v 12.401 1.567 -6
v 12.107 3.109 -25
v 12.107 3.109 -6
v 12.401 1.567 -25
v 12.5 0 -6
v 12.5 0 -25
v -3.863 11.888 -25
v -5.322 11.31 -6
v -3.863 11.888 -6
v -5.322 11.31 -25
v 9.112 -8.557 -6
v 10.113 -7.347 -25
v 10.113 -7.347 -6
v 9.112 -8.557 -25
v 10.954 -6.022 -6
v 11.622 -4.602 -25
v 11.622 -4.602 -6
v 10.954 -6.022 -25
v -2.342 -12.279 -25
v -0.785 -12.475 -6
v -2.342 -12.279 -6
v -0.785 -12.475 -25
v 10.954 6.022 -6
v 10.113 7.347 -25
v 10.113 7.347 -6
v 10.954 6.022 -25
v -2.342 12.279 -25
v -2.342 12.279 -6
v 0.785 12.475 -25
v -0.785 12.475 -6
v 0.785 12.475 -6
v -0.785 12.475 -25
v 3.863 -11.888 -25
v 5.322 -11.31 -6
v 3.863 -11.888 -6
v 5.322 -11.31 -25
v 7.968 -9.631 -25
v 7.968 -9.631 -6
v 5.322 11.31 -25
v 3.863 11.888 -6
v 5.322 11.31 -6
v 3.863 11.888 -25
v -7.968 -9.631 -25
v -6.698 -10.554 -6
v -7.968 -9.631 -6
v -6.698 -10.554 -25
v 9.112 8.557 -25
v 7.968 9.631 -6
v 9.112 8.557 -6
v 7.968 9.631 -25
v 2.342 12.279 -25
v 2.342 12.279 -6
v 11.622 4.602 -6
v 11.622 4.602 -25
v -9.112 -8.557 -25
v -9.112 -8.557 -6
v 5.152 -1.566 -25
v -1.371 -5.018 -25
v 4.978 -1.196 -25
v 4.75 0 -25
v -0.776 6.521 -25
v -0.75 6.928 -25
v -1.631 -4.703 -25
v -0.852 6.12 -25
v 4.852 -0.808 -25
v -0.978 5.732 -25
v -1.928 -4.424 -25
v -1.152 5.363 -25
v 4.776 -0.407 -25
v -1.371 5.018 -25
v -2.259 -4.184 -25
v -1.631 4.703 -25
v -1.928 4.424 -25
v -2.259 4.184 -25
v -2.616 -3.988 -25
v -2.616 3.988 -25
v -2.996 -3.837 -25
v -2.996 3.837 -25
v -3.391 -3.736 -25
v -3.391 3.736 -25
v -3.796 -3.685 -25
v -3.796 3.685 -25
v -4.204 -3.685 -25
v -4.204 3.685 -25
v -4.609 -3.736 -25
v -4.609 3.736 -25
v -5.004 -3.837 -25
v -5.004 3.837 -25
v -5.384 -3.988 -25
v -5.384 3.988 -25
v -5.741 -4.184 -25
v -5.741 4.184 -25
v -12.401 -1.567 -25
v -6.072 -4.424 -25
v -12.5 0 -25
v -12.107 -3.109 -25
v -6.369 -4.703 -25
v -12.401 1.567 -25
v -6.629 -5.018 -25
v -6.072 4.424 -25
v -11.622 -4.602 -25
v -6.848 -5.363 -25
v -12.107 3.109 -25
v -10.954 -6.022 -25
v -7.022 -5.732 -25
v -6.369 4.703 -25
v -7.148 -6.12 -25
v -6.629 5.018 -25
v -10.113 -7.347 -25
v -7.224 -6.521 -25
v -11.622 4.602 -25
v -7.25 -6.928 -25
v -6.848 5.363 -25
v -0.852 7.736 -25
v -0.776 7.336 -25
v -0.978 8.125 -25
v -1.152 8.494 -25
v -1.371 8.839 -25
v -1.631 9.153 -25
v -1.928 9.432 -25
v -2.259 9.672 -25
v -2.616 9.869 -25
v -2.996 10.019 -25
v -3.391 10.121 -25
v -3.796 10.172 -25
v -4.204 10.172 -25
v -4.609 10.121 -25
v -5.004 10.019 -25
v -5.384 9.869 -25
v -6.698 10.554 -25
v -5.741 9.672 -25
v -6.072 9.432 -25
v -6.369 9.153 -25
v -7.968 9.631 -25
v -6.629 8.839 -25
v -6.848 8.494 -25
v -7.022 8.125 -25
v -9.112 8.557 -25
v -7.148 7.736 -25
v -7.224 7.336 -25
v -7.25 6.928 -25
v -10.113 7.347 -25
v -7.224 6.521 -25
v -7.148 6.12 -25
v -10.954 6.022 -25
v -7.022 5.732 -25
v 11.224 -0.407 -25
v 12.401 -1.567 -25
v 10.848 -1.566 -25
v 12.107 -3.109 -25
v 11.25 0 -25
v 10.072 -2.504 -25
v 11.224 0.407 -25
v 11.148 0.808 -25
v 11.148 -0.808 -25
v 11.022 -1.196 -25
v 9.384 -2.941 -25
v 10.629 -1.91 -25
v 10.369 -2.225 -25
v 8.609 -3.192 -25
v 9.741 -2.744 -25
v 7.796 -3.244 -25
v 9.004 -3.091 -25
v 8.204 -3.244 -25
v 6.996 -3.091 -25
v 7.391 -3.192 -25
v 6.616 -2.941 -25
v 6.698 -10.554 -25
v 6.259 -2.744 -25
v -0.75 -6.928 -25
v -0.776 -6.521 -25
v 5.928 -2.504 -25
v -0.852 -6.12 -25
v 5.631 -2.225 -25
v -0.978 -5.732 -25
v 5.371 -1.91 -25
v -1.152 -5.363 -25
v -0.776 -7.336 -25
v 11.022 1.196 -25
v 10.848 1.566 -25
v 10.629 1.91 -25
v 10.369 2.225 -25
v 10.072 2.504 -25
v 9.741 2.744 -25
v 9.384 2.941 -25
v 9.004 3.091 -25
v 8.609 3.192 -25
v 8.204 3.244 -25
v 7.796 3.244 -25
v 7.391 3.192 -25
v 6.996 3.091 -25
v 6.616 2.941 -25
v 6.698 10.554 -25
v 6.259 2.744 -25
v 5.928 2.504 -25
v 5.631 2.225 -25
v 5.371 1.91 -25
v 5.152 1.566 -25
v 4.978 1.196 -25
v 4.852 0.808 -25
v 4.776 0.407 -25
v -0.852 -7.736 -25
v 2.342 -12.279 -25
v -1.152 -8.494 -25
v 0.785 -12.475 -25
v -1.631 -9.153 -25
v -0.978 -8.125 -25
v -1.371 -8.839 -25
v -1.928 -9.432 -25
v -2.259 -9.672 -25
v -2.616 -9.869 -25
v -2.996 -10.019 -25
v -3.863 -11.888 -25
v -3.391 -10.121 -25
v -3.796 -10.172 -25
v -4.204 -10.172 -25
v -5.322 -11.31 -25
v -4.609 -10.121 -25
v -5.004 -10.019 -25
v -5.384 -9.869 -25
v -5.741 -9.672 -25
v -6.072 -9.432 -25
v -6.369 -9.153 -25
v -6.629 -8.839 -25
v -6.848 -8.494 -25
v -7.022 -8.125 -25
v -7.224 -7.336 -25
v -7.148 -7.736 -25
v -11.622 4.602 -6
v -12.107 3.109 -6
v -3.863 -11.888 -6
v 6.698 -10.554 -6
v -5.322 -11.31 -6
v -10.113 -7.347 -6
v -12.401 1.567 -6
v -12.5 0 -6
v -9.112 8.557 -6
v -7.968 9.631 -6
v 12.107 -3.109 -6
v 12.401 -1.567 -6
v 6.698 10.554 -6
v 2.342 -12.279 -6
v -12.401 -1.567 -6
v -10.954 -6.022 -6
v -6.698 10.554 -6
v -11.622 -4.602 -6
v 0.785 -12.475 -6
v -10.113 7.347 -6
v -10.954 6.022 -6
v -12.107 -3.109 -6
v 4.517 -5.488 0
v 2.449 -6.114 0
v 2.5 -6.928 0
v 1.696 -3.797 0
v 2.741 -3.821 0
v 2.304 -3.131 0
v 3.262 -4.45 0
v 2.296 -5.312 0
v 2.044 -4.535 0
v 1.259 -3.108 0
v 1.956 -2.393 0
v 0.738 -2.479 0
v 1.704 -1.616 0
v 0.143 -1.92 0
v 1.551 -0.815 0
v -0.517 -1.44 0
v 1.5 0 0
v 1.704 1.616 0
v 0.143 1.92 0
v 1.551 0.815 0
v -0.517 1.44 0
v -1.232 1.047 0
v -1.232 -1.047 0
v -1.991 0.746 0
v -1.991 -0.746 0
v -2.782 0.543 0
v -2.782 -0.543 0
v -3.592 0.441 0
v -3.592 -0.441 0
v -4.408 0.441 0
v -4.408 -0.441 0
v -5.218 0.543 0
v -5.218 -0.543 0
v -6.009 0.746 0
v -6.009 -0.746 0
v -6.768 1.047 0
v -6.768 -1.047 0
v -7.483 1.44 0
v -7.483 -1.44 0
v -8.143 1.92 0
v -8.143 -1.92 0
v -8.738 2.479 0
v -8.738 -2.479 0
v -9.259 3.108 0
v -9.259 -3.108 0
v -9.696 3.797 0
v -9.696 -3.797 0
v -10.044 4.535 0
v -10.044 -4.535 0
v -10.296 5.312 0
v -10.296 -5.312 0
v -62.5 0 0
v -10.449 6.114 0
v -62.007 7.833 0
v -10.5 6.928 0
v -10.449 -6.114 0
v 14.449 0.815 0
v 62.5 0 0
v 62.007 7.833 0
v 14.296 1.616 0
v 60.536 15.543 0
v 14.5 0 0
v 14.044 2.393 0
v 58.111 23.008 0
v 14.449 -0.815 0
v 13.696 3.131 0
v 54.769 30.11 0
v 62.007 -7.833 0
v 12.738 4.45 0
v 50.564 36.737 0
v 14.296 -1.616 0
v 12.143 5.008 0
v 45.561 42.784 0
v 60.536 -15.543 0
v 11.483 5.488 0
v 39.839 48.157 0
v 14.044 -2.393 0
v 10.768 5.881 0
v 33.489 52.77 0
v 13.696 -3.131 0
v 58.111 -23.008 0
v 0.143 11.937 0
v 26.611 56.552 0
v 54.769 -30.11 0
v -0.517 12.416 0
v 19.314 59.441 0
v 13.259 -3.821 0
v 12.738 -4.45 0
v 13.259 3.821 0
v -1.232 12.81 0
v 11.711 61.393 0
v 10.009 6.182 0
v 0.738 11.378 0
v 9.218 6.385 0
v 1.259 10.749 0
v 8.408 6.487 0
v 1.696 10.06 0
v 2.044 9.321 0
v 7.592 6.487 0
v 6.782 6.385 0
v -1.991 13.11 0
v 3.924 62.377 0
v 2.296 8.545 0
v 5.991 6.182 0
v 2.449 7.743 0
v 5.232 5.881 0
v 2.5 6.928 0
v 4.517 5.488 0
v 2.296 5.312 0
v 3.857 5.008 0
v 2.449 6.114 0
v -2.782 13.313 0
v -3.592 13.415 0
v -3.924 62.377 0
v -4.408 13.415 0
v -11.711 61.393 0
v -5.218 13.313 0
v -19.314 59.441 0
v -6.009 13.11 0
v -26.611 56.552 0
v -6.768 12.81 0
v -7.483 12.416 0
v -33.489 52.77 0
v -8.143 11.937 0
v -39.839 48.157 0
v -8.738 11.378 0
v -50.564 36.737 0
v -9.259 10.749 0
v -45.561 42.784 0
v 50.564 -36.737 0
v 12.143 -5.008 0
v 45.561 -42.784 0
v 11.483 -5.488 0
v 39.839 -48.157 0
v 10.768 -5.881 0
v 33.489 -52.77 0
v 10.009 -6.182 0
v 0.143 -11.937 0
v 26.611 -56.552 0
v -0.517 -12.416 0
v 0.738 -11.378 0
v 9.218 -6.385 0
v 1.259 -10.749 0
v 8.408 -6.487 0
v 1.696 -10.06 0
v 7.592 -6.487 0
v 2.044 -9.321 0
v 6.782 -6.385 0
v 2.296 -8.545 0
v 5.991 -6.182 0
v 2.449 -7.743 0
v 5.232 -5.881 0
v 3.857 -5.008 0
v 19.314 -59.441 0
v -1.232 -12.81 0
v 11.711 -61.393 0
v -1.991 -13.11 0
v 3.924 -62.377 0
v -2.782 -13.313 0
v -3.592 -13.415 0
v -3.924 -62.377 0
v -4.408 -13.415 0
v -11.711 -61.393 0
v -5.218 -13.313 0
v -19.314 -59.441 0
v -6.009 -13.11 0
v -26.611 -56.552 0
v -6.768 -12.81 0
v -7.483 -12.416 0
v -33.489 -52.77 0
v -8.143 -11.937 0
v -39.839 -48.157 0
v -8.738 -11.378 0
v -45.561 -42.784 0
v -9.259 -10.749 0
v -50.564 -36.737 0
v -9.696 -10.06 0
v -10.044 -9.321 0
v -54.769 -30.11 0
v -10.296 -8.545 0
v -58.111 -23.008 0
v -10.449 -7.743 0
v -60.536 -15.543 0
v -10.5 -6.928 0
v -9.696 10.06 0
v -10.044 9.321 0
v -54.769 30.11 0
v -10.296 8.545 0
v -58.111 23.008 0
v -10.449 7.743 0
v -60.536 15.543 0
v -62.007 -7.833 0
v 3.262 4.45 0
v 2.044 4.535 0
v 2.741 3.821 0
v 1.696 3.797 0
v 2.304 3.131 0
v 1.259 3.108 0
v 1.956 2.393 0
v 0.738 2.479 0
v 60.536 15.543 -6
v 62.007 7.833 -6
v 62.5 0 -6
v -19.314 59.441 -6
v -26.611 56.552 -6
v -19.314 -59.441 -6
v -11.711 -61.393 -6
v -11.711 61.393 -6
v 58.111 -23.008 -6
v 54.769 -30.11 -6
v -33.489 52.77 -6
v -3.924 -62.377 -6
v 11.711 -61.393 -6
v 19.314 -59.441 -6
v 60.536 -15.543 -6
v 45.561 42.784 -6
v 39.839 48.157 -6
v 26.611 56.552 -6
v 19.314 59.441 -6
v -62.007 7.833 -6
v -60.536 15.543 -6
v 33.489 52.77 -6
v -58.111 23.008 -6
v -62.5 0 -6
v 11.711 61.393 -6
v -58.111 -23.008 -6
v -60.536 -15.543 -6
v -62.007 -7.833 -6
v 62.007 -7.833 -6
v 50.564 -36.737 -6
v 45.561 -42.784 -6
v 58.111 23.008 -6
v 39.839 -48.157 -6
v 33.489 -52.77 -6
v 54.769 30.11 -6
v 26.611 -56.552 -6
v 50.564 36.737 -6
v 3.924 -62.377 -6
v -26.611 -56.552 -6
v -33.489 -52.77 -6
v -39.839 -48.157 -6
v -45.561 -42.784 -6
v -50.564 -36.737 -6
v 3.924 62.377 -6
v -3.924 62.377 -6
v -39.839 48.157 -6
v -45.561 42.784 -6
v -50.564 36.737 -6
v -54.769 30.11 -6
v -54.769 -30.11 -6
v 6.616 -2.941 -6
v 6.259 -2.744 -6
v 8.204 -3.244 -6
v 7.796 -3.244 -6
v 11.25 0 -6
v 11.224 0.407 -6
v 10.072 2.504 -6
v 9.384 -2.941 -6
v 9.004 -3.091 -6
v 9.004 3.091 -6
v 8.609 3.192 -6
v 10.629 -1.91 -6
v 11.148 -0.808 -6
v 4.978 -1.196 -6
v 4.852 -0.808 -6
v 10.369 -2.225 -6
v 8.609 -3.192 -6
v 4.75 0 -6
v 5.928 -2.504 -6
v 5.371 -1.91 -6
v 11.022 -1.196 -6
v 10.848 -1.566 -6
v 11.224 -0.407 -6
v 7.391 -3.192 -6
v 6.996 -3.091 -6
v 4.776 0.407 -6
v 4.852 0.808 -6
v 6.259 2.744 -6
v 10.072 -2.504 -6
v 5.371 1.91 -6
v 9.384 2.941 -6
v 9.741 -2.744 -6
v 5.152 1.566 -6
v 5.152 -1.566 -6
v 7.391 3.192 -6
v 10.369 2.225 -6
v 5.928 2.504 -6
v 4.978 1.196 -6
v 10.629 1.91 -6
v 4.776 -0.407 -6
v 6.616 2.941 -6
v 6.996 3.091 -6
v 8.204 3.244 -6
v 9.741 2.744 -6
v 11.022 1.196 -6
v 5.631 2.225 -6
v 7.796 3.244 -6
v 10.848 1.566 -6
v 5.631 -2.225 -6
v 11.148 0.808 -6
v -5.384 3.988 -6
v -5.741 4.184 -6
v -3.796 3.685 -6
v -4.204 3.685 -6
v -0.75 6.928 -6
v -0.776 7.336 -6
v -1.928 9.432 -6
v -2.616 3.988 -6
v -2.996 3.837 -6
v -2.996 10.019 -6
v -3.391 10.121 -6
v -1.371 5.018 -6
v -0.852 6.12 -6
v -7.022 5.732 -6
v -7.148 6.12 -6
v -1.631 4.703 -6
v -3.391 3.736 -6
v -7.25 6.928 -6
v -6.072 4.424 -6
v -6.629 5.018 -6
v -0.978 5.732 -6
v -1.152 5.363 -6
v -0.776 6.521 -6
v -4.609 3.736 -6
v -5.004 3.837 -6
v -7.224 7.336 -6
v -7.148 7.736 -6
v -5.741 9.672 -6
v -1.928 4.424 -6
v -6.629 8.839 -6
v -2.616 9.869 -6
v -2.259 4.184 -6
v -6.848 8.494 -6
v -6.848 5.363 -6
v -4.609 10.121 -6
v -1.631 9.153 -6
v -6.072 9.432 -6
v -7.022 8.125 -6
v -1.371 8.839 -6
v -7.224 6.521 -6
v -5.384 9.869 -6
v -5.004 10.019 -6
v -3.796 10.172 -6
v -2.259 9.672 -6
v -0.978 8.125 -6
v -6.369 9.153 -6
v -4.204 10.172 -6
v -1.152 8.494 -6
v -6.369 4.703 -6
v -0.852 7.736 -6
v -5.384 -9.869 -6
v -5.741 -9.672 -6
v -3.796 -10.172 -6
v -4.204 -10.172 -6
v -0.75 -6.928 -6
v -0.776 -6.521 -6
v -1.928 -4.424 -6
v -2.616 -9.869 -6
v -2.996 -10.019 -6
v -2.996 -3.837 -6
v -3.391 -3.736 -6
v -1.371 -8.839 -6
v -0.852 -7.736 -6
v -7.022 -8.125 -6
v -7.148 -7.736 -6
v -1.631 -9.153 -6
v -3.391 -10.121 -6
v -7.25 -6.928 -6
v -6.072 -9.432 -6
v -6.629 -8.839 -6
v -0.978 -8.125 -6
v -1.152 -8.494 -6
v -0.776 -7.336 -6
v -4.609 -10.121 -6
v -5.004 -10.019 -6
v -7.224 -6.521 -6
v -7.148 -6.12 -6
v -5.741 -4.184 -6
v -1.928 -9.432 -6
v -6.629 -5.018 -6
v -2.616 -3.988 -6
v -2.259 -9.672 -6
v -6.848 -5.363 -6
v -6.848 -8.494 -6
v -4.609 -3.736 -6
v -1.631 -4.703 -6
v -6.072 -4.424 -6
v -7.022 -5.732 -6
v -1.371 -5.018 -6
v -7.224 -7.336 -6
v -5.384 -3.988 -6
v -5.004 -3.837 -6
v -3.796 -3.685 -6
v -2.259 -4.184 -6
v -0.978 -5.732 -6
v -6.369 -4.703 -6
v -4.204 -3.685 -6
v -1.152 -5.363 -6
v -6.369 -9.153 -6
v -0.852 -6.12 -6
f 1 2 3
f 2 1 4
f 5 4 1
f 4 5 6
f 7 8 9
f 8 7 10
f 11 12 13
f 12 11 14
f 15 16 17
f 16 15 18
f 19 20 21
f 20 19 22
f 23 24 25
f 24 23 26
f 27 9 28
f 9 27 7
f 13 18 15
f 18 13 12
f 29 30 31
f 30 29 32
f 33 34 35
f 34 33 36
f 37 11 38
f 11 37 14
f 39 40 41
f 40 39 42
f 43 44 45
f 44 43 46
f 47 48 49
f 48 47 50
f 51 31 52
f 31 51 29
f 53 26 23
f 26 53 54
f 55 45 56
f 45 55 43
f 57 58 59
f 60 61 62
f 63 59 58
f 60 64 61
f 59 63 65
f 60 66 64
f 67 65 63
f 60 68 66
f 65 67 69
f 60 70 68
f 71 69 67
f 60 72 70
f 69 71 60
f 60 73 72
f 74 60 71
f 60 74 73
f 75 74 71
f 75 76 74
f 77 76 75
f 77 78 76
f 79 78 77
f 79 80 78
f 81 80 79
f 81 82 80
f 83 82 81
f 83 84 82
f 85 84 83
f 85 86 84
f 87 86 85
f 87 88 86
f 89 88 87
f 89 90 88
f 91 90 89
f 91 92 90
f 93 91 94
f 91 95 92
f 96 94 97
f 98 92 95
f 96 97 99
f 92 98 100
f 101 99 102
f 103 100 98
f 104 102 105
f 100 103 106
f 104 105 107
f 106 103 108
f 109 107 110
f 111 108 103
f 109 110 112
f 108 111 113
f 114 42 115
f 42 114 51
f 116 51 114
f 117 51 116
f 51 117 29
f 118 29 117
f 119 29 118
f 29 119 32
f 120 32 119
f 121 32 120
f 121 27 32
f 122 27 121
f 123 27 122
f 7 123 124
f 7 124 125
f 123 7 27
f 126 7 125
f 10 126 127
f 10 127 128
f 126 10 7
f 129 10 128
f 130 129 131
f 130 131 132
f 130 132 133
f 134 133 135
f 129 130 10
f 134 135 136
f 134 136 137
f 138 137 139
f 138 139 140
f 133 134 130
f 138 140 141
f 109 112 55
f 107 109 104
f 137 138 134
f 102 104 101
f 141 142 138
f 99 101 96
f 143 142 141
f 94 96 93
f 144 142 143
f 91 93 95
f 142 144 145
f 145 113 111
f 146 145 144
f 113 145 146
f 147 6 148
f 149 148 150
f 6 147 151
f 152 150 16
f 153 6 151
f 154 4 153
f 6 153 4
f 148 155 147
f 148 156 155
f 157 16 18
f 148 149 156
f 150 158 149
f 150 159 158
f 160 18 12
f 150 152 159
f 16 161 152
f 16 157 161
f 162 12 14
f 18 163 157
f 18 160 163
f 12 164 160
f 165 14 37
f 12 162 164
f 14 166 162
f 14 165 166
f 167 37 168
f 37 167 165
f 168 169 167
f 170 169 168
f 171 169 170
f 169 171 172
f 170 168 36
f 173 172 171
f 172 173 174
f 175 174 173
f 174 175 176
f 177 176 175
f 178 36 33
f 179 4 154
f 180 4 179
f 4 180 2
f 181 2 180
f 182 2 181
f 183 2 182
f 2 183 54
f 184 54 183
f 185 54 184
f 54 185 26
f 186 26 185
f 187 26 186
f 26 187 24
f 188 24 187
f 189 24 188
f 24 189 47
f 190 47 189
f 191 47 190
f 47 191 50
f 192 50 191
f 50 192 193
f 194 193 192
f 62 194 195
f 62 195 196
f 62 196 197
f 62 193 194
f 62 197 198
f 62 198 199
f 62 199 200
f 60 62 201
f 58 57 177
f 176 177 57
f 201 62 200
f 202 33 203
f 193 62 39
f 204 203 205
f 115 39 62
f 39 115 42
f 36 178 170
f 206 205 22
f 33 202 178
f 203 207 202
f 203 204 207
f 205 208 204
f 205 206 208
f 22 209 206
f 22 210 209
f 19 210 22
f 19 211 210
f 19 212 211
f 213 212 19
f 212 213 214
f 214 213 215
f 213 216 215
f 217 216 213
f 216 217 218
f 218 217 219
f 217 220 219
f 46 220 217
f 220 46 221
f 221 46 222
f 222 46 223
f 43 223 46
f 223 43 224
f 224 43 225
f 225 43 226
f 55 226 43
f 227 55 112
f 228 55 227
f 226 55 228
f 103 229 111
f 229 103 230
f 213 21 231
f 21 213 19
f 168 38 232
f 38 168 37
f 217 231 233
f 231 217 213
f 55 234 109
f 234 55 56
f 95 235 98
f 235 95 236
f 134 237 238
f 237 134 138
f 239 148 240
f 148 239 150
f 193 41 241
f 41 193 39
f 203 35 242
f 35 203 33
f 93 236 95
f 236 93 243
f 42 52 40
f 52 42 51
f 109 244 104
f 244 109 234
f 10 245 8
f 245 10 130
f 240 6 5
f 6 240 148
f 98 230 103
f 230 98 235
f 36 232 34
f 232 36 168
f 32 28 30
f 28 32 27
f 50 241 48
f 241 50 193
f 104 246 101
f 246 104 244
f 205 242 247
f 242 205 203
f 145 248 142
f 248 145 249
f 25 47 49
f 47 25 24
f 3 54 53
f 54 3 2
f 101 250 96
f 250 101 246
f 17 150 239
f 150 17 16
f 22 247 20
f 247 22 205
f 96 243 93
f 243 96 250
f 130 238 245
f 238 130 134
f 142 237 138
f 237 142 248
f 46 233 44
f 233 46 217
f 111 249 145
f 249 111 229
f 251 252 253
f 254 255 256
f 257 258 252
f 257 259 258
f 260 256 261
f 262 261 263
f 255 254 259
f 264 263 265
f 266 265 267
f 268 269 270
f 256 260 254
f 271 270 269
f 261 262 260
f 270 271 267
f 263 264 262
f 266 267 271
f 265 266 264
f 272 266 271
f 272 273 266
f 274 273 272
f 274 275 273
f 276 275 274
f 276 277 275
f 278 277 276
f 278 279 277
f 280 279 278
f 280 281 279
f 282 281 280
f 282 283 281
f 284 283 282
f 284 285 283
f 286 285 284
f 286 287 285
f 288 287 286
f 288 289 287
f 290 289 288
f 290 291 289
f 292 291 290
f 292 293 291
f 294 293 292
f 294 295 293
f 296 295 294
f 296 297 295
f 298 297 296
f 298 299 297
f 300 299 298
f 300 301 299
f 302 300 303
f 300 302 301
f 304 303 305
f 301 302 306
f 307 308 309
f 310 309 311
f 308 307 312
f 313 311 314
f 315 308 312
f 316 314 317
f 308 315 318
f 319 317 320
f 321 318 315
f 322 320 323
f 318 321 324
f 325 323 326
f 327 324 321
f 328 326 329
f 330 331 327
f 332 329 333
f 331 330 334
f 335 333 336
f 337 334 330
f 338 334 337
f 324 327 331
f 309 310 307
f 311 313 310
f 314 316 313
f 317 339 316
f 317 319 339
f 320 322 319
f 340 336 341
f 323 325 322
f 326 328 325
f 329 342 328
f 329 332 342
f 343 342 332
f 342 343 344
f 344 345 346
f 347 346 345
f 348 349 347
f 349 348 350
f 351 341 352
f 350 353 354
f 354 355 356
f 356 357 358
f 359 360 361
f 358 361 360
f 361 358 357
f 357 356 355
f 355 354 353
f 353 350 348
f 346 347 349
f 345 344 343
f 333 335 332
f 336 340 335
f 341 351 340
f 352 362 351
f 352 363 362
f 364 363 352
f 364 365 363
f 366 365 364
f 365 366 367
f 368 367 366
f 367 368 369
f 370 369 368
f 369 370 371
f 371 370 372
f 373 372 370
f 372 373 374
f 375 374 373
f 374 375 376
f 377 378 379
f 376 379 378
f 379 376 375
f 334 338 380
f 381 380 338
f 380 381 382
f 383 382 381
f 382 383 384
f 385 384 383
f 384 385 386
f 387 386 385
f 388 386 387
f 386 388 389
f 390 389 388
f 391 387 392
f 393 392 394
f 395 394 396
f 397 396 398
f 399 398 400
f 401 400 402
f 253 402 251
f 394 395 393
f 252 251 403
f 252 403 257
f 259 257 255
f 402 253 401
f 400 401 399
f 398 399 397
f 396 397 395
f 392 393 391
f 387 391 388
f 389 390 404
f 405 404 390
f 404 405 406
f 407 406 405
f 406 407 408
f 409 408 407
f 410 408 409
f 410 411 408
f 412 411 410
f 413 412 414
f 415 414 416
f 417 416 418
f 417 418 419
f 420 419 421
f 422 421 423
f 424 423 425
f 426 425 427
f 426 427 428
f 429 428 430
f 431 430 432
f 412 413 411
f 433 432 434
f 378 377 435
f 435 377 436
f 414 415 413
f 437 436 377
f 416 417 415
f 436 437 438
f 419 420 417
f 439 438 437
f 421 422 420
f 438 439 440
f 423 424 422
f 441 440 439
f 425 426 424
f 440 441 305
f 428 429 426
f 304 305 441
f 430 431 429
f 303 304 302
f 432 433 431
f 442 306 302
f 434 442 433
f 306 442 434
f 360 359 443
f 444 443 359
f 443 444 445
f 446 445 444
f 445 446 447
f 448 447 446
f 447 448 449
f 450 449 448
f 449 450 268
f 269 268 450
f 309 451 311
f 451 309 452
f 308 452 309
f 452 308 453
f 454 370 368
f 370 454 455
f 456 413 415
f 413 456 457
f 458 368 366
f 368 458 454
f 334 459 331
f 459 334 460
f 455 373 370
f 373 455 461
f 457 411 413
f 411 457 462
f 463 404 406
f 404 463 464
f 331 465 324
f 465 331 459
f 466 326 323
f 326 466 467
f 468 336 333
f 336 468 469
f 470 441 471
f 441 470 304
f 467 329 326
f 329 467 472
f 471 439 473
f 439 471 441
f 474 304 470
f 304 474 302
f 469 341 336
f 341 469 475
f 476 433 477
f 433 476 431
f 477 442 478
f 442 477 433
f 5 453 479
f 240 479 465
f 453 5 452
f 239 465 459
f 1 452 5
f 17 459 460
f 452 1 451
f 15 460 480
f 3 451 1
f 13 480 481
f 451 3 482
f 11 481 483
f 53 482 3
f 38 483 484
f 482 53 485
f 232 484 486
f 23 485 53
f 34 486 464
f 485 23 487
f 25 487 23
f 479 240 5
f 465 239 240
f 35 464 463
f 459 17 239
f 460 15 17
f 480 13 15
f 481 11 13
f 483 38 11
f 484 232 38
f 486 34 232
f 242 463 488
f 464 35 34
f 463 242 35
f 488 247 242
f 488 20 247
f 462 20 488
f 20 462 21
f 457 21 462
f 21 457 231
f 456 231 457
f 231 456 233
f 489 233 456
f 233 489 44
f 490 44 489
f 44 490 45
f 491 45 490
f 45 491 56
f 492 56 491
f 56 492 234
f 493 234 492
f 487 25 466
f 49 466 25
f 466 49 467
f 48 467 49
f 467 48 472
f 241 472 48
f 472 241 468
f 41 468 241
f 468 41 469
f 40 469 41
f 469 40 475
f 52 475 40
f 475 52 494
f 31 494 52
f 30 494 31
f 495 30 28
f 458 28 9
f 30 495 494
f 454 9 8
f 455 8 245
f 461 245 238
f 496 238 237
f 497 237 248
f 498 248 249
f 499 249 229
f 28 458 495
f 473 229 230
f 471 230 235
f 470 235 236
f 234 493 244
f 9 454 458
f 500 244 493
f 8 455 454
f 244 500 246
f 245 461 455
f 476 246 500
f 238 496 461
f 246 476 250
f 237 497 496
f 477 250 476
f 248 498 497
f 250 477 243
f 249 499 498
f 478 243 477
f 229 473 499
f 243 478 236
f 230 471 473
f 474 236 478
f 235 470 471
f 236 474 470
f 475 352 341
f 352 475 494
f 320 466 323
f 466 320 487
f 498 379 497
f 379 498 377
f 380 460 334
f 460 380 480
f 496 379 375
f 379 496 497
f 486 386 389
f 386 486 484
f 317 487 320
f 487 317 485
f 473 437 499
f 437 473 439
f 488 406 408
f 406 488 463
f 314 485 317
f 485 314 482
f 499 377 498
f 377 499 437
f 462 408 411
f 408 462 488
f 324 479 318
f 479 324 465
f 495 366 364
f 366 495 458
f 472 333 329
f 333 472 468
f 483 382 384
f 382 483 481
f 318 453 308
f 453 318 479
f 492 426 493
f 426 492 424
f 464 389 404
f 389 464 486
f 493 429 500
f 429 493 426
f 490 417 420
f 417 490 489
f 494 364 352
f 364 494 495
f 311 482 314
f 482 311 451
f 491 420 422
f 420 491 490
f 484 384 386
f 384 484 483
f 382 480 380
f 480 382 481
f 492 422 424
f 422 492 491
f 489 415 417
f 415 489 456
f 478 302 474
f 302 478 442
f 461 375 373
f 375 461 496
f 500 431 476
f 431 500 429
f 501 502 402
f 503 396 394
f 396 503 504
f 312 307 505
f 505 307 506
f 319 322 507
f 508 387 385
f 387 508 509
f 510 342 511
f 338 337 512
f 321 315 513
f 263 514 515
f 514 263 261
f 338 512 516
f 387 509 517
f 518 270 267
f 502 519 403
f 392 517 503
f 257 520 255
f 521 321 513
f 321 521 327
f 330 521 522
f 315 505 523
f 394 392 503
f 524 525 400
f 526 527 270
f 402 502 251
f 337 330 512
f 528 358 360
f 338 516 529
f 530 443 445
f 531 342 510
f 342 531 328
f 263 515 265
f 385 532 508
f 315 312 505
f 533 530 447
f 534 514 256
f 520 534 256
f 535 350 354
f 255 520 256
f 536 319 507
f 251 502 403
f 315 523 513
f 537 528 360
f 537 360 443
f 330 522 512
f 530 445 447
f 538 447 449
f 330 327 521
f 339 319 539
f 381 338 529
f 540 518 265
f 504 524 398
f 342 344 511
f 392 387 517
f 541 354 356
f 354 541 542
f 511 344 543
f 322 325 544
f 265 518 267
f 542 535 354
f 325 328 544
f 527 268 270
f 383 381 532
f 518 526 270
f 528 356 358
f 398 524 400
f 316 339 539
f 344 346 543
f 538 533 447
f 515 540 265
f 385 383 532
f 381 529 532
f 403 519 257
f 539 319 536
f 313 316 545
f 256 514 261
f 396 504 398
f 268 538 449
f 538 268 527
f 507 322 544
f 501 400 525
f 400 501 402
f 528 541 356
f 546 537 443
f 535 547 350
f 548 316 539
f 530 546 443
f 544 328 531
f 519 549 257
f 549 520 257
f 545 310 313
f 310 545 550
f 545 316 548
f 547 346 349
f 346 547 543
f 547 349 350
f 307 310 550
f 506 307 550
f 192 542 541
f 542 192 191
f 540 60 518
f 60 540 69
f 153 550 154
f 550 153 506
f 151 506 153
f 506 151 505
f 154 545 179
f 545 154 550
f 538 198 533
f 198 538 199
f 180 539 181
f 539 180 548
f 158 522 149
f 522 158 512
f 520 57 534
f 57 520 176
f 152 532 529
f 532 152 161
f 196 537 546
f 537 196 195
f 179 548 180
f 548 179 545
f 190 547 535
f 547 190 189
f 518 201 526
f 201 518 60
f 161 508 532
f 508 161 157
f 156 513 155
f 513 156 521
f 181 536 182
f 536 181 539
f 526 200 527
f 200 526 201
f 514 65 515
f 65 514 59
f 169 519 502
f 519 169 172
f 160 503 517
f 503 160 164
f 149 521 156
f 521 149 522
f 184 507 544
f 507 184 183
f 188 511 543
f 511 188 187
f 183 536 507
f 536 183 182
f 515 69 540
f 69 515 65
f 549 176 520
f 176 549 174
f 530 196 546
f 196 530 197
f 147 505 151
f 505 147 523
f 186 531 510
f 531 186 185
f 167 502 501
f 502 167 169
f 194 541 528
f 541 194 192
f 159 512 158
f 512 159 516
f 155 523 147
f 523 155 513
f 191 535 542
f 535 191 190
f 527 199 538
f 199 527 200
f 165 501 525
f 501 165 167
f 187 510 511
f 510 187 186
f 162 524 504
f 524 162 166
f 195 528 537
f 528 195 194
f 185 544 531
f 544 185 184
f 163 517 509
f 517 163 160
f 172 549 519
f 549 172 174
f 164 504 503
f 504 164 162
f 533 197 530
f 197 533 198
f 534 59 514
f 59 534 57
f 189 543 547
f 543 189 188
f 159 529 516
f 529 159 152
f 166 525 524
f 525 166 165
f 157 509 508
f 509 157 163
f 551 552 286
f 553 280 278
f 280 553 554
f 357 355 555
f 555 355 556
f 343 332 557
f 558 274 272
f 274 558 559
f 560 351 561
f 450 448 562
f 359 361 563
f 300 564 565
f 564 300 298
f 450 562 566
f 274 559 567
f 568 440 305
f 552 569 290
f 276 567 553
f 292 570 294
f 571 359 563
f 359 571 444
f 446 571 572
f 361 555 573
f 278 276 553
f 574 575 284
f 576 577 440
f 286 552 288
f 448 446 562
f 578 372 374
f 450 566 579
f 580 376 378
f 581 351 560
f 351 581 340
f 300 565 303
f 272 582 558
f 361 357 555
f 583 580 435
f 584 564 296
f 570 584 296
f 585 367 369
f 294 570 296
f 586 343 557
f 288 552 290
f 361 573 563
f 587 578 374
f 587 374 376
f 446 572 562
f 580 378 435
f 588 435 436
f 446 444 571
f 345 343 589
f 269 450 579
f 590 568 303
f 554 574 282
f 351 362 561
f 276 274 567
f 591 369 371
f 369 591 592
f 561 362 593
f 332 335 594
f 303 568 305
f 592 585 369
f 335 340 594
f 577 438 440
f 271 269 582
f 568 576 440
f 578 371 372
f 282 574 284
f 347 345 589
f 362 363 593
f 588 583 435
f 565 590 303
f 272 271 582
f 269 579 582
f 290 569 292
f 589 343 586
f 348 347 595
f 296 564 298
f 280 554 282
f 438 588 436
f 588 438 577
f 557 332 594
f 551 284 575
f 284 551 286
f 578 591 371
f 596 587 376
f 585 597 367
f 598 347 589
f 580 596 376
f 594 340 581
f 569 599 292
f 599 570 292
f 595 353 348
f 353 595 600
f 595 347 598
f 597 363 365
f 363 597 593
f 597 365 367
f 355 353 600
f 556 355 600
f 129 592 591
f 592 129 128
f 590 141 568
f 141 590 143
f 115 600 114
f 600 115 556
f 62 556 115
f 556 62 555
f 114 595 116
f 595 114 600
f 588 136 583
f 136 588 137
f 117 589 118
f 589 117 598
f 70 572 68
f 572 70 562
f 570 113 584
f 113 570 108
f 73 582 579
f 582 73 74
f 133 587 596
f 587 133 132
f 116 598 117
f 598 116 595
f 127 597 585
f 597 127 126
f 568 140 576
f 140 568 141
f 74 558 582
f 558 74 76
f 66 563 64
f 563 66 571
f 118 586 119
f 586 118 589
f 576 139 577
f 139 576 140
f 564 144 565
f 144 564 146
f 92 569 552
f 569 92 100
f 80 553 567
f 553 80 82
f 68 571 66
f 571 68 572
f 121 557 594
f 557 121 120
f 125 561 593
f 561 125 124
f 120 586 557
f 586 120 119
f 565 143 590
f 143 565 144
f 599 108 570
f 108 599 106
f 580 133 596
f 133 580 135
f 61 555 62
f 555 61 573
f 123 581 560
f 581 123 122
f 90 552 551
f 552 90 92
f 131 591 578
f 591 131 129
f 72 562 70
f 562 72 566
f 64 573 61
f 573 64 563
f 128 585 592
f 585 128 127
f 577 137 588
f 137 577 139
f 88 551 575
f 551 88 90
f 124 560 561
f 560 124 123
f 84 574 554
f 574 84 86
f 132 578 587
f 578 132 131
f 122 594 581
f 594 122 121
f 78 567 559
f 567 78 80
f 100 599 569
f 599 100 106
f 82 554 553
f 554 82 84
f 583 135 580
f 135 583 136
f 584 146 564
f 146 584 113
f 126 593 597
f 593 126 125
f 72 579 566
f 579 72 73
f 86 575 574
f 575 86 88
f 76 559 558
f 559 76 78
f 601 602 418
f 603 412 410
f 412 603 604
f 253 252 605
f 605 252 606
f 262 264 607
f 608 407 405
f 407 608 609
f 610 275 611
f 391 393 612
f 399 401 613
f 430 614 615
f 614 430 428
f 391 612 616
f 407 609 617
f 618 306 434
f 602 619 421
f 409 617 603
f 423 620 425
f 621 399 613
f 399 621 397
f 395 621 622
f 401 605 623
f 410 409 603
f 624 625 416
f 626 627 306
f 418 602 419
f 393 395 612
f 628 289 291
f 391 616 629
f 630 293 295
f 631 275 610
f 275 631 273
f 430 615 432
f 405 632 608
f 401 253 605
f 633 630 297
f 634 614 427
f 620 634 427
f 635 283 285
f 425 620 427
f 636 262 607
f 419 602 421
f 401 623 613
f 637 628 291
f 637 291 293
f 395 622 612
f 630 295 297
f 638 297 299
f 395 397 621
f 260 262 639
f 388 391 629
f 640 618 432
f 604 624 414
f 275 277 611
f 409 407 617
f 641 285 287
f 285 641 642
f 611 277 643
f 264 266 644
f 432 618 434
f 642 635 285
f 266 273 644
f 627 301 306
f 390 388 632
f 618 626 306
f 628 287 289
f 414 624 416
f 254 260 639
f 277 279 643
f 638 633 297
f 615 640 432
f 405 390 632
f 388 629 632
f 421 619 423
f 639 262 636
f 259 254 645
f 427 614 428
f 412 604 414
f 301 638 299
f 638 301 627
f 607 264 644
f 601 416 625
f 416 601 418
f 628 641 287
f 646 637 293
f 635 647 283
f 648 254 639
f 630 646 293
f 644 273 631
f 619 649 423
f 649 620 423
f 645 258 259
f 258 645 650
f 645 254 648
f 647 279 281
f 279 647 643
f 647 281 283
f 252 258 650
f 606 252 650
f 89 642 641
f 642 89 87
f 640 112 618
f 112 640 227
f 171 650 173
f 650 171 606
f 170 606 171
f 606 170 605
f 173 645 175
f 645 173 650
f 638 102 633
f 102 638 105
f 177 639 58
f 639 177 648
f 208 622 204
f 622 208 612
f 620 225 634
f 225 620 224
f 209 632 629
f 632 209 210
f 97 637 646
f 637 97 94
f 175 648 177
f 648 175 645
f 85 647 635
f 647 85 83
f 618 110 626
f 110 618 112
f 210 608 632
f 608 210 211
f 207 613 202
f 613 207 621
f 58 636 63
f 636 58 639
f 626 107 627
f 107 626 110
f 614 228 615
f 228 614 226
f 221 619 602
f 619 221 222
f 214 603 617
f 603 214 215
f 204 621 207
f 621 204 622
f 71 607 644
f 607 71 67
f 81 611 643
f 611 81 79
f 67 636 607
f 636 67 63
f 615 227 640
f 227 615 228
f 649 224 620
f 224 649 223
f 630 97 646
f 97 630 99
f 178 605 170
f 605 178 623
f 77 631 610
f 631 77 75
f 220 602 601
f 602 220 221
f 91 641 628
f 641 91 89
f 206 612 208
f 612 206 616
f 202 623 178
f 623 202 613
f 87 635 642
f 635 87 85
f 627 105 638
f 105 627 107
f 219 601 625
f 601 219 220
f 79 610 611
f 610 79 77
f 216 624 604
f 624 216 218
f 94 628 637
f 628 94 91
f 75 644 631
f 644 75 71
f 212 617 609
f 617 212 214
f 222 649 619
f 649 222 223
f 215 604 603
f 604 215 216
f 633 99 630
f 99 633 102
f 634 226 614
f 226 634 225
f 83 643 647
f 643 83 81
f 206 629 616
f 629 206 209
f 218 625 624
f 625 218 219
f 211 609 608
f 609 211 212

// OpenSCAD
$fn = 50;


difference() {
	union() {
		translate(v = [0, 0, -25.0000000000]) {
			cylinder(h = 25, r = 12.5000000000);
		}
		translate(v = [0, 0, -6.0000000000]) {
			cylinder(h = 6, r = 62.5000000000);
		}
	}
	union() {
		translate(v = [8.0000000000, 0.0000000000, 0]) {
			rotate(a = [0, 0, 0]) {
				difference() {
					union() {
						#translate(v = [0, 0, -25.0000000000]) {
							cylinder(h = 25, r = 2.2500000000);
						}
						#translate(v = [0, 0, -6]) {
							cylinder(h = 6, r = 12.5000000000, r1 = 3.2500000000, r2 = 6.5000000000);
						}
						#translate(v = [0, 0, -25.0000000000]) {
							cylinder(h = 25, r = 3.2500000000);
						}
						#translate(v = [0, 0, -25.0000000000]) {
							cylinder(h = 25, r = 2.2500000000);
						}
					}
					union();
				}
			}
		}
		translate(v = [-4.0000000000, 6.9282032303, 0]) {
			rotate(a = [0, 0, 0]) {
				difference() {
					union() {
						#translate(v = [0, 0, -25.0000000000]) {
							cylinder(h = 25, r = 2.2500000000);
						}
						#translate(v = [0, 0, -6]) {
							cylinder(h = 6, r = 12.5000000000, r1 = 3.2500000000, r2 = 6.5000000000);
						}
						#translate(v = [0, 0, -25.0000000000]) {
							cylinder(h = 25, r = 3.2500000000);
						}
						#translate(v = [0, 0, -25.0000000000]) {
							cylinder(h = 25, r = 2.2500000000);
						}
					}
					union();
				}
			}
		}
		translate(v = [-4.0000000000, -6.9282032303, 0]) {
			rotate(a = [0, 0, 0]) {
				difference() {
					union() {
						#translate(v = [0, 0, -25.0000000000]) {
							cylinder(h = 25, r = 2.2500000000);
						}
						#translate(v = [0, 0, -6]) {
							cylinder(h = 6, r = 12.5000000000, r1 = 3.2500000000, r2 = 6.5000000000);
						}
						#translate(v = [0, 0, -25.0000000000]) {
							cylinder(h = 25, r = 3.2500000000);
						}
						#translate(v = [0, 0, -25.0000000000]) {
							cylinder(h = 25, r = 2.2500000000);
						}
					}
					union();
				}
			}
		}
	}
}
